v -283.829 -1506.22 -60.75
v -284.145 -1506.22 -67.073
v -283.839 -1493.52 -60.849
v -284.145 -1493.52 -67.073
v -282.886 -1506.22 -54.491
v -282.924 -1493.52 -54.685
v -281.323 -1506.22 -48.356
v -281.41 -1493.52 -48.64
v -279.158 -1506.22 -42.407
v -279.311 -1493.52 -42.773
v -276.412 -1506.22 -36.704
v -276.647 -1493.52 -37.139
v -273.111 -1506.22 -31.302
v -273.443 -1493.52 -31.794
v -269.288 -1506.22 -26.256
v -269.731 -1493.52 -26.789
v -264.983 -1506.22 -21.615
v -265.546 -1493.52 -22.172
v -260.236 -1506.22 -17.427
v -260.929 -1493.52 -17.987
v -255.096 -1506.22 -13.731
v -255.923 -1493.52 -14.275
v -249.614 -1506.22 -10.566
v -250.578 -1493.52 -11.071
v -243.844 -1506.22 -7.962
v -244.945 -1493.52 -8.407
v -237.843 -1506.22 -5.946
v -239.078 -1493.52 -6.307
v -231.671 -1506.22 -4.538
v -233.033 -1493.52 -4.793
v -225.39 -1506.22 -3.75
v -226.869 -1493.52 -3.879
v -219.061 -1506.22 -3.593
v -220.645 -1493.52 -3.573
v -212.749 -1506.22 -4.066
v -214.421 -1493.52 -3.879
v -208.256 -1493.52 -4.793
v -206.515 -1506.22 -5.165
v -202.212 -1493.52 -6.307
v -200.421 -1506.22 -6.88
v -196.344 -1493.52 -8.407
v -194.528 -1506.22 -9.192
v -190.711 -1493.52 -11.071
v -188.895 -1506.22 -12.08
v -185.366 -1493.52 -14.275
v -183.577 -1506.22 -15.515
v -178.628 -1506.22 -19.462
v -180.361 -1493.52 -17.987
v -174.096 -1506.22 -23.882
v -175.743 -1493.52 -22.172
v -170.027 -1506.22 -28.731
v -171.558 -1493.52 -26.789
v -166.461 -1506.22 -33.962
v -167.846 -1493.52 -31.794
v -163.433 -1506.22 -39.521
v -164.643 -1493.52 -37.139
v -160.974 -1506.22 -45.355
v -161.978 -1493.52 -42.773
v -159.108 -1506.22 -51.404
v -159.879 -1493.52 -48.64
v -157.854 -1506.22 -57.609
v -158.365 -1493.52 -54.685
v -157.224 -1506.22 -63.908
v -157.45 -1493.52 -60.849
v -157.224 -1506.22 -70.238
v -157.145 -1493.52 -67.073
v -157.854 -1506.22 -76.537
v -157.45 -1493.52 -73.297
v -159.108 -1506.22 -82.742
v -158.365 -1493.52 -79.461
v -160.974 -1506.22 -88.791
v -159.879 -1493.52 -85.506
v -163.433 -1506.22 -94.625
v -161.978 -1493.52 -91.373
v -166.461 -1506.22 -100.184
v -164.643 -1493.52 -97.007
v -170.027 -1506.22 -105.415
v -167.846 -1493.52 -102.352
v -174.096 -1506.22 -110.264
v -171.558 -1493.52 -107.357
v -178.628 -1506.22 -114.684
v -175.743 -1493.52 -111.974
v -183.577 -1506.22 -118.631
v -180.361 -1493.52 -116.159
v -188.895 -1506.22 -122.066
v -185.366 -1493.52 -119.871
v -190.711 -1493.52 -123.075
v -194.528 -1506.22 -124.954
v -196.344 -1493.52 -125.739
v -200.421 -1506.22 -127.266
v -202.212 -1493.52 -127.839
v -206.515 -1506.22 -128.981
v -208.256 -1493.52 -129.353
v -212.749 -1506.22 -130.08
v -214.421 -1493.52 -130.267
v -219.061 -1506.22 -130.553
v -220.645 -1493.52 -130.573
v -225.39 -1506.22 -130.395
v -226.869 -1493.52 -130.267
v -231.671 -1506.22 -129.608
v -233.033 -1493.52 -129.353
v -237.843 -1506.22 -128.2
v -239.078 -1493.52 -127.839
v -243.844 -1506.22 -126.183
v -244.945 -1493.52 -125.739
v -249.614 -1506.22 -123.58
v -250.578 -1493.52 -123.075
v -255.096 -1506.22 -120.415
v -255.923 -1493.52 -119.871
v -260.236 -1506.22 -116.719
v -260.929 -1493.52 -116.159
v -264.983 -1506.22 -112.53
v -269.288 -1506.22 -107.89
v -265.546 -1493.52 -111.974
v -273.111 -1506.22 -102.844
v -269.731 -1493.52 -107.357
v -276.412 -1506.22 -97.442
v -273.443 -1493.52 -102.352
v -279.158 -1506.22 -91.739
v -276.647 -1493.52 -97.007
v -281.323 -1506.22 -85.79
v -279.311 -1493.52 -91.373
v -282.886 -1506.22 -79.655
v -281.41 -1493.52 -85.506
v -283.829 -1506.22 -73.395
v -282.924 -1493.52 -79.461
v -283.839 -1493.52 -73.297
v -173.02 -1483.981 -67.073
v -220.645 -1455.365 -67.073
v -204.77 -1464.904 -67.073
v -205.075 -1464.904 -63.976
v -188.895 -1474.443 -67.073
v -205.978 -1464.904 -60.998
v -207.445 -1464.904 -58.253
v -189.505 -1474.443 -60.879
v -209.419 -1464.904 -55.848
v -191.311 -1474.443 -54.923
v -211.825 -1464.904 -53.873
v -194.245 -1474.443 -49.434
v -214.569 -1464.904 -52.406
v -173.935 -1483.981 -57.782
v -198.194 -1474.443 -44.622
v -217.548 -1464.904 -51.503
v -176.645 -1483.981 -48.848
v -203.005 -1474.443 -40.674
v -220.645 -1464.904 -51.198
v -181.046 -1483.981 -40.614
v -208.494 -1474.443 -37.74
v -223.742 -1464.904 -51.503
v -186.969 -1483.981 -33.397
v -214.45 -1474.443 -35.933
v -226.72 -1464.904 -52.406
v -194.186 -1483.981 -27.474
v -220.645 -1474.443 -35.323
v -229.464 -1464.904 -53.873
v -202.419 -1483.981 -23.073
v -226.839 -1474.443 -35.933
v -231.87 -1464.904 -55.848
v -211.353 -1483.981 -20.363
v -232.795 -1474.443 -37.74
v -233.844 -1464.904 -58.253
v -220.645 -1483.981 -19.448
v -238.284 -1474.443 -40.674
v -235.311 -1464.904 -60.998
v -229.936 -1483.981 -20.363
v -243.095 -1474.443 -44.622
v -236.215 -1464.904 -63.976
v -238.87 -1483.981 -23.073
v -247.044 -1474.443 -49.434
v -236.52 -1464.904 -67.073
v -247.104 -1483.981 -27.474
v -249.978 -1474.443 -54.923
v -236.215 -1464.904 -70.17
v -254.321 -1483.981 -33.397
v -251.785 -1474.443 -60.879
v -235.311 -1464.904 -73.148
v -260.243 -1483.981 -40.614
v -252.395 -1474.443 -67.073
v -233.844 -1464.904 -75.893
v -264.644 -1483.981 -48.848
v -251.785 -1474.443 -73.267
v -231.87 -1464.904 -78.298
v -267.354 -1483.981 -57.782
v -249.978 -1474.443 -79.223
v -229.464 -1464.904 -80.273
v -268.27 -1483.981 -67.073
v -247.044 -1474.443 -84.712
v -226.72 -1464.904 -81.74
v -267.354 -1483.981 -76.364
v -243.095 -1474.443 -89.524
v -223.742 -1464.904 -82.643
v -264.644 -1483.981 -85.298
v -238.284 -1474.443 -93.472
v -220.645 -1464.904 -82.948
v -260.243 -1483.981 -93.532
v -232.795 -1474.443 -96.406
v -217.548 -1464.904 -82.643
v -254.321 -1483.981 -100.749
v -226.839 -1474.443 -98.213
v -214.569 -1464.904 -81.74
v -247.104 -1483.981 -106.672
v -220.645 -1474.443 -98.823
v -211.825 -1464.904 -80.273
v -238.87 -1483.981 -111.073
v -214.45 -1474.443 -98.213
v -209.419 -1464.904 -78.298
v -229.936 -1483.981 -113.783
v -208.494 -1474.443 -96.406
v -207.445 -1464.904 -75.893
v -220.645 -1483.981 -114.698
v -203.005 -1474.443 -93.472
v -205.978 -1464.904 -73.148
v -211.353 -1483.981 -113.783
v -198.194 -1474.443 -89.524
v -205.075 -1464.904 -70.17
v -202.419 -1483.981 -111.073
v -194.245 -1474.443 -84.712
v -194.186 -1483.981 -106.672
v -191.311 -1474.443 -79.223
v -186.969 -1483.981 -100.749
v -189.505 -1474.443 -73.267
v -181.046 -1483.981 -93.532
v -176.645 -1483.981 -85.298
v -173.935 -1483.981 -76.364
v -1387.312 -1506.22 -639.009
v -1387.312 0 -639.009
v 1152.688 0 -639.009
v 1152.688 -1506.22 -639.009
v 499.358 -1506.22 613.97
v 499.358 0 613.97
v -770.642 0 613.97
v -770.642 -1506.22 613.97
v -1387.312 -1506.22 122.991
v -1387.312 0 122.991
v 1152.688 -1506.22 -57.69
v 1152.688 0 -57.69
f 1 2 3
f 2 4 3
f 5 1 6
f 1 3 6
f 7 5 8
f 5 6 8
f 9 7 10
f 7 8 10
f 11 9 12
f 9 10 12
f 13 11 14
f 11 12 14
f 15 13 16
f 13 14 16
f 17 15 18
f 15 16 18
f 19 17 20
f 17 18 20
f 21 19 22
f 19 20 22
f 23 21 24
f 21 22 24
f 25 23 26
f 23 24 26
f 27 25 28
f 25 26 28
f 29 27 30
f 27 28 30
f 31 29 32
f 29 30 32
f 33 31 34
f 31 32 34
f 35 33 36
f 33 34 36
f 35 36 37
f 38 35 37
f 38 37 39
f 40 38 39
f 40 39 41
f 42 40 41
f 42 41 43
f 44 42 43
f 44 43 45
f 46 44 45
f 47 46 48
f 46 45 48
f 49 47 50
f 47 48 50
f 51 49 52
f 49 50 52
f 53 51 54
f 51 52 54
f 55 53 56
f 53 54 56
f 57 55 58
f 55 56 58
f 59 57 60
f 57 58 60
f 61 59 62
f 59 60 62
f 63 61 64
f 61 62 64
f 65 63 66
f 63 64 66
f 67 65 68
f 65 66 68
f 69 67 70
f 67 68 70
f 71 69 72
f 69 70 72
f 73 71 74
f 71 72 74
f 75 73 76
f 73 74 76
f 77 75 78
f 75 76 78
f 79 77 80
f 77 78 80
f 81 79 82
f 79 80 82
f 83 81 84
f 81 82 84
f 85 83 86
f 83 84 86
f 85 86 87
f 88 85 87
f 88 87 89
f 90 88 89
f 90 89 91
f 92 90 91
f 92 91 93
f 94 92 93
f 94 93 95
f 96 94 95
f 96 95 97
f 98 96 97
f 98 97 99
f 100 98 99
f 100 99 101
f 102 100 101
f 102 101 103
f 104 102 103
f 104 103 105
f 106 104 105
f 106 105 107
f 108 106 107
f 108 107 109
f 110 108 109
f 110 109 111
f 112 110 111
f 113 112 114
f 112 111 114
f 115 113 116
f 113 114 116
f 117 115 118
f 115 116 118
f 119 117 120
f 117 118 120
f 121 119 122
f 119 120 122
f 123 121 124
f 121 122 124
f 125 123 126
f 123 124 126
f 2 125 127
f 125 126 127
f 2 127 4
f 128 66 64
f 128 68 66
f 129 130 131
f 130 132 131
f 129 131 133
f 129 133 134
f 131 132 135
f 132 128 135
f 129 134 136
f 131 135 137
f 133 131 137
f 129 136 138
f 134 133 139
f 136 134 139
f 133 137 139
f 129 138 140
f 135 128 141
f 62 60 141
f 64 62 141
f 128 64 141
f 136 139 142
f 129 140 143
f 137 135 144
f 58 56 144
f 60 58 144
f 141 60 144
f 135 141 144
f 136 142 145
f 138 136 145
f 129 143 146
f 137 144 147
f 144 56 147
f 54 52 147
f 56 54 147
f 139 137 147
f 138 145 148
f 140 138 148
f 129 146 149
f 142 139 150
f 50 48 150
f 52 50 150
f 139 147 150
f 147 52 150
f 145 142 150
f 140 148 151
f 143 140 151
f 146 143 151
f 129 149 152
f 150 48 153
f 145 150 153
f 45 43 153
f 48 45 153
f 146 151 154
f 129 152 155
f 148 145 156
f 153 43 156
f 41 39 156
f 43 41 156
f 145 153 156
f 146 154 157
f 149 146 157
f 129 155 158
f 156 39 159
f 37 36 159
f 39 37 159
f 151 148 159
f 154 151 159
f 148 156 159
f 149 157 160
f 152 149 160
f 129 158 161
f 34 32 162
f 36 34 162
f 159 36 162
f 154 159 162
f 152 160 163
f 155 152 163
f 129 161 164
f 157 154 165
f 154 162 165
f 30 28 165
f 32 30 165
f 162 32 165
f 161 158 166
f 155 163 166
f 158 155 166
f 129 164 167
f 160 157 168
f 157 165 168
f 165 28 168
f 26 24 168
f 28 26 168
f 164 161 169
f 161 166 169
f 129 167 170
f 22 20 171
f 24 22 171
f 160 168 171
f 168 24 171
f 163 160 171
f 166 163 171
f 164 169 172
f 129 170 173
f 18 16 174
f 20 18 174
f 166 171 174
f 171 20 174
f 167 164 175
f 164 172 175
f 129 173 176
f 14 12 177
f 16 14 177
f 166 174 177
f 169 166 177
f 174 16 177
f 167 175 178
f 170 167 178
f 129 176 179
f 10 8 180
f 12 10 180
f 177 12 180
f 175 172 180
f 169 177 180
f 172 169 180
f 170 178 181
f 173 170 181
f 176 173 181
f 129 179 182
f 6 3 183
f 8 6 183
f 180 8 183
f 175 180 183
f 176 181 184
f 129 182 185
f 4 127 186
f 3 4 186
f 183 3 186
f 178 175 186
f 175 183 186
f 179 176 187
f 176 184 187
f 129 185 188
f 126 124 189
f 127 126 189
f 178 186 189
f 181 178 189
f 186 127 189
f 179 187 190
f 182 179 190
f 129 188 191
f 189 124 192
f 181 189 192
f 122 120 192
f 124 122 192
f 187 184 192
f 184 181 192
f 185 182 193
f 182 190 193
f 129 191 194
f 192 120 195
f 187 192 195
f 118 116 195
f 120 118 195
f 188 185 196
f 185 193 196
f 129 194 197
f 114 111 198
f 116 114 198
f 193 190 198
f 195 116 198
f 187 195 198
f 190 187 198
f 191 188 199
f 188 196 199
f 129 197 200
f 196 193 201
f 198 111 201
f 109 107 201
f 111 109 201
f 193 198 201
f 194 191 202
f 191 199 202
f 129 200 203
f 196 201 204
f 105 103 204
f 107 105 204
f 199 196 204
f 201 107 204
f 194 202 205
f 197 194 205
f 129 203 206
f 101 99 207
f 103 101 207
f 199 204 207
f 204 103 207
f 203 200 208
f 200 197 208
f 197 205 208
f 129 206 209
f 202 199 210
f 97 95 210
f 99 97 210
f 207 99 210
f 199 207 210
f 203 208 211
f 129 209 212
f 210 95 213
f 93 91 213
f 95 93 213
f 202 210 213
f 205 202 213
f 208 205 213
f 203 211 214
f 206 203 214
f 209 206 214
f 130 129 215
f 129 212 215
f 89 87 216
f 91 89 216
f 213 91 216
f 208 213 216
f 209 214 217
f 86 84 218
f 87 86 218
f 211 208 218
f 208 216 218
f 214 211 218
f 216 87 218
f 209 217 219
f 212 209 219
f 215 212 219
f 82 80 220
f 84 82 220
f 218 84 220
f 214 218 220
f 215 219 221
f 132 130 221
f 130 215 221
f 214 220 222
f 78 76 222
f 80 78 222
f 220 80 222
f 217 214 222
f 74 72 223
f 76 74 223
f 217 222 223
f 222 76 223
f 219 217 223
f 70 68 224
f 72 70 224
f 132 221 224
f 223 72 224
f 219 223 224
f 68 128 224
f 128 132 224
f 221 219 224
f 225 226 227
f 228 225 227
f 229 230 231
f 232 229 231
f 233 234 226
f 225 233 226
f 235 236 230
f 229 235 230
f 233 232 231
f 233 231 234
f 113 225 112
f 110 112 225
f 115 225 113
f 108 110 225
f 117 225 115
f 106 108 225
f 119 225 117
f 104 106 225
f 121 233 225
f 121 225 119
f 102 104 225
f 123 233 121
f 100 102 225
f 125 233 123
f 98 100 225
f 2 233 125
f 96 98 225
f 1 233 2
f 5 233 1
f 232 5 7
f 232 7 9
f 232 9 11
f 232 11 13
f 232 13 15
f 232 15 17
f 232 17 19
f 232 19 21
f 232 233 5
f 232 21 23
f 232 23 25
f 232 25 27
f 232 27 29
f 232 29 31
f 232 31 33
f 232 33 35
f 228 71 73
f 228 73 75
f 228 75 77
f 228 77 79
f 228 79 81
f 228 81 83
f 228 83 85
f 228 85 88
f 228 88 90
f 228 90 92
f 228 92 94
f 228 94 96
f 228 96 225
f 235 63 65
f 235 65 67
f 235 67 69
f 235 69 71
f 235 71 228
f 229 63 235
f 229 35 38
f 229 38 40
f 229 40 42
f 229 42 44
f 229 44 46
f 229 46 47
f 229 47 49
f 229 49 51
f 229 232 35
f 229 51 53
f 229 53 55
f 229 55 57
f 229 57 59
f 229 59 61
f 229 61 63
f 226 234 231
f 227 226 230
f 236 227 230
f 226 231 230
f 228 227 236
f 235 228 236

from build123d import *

# Parameters (mm, degrees)
F1_DEPTH = 1506.22
F3_D     = 127
F3_DEPTH = 12.7
F3_TIP   = 38.1546493083


with BuildPart() as f1:
    # F0 (on Front) → F1 (new body)
    with BuildSketch(Plane.XZ):
        Polygon((-770.6423540949, 613.970125735), (-1387.3124781203, 122.9907713829), (-1387.3124781203, -639.0092286171), (1152.6875218797, -639.0092286171), (1152.6875218797, -57.6896484572), (499.3576459051, 613.970125735), align=None)
    extrude(amount=F1_DEPTH)

    # F3
    with Locations(Plane.XZ.offset(1506.22)):
        with Locations((-220.6445932388, -67.0729279518)):
            Hole(F3_D / 2, depth=F3_DEPTH)
            with Locations((0, 0, -(F3_DEPTH + F3_TIP / 2))):  # 118° drill point
                Cone(0, F3_D / 2, F3_TIP, mode=Mode.SUBTRACT)


solid = f1.part
